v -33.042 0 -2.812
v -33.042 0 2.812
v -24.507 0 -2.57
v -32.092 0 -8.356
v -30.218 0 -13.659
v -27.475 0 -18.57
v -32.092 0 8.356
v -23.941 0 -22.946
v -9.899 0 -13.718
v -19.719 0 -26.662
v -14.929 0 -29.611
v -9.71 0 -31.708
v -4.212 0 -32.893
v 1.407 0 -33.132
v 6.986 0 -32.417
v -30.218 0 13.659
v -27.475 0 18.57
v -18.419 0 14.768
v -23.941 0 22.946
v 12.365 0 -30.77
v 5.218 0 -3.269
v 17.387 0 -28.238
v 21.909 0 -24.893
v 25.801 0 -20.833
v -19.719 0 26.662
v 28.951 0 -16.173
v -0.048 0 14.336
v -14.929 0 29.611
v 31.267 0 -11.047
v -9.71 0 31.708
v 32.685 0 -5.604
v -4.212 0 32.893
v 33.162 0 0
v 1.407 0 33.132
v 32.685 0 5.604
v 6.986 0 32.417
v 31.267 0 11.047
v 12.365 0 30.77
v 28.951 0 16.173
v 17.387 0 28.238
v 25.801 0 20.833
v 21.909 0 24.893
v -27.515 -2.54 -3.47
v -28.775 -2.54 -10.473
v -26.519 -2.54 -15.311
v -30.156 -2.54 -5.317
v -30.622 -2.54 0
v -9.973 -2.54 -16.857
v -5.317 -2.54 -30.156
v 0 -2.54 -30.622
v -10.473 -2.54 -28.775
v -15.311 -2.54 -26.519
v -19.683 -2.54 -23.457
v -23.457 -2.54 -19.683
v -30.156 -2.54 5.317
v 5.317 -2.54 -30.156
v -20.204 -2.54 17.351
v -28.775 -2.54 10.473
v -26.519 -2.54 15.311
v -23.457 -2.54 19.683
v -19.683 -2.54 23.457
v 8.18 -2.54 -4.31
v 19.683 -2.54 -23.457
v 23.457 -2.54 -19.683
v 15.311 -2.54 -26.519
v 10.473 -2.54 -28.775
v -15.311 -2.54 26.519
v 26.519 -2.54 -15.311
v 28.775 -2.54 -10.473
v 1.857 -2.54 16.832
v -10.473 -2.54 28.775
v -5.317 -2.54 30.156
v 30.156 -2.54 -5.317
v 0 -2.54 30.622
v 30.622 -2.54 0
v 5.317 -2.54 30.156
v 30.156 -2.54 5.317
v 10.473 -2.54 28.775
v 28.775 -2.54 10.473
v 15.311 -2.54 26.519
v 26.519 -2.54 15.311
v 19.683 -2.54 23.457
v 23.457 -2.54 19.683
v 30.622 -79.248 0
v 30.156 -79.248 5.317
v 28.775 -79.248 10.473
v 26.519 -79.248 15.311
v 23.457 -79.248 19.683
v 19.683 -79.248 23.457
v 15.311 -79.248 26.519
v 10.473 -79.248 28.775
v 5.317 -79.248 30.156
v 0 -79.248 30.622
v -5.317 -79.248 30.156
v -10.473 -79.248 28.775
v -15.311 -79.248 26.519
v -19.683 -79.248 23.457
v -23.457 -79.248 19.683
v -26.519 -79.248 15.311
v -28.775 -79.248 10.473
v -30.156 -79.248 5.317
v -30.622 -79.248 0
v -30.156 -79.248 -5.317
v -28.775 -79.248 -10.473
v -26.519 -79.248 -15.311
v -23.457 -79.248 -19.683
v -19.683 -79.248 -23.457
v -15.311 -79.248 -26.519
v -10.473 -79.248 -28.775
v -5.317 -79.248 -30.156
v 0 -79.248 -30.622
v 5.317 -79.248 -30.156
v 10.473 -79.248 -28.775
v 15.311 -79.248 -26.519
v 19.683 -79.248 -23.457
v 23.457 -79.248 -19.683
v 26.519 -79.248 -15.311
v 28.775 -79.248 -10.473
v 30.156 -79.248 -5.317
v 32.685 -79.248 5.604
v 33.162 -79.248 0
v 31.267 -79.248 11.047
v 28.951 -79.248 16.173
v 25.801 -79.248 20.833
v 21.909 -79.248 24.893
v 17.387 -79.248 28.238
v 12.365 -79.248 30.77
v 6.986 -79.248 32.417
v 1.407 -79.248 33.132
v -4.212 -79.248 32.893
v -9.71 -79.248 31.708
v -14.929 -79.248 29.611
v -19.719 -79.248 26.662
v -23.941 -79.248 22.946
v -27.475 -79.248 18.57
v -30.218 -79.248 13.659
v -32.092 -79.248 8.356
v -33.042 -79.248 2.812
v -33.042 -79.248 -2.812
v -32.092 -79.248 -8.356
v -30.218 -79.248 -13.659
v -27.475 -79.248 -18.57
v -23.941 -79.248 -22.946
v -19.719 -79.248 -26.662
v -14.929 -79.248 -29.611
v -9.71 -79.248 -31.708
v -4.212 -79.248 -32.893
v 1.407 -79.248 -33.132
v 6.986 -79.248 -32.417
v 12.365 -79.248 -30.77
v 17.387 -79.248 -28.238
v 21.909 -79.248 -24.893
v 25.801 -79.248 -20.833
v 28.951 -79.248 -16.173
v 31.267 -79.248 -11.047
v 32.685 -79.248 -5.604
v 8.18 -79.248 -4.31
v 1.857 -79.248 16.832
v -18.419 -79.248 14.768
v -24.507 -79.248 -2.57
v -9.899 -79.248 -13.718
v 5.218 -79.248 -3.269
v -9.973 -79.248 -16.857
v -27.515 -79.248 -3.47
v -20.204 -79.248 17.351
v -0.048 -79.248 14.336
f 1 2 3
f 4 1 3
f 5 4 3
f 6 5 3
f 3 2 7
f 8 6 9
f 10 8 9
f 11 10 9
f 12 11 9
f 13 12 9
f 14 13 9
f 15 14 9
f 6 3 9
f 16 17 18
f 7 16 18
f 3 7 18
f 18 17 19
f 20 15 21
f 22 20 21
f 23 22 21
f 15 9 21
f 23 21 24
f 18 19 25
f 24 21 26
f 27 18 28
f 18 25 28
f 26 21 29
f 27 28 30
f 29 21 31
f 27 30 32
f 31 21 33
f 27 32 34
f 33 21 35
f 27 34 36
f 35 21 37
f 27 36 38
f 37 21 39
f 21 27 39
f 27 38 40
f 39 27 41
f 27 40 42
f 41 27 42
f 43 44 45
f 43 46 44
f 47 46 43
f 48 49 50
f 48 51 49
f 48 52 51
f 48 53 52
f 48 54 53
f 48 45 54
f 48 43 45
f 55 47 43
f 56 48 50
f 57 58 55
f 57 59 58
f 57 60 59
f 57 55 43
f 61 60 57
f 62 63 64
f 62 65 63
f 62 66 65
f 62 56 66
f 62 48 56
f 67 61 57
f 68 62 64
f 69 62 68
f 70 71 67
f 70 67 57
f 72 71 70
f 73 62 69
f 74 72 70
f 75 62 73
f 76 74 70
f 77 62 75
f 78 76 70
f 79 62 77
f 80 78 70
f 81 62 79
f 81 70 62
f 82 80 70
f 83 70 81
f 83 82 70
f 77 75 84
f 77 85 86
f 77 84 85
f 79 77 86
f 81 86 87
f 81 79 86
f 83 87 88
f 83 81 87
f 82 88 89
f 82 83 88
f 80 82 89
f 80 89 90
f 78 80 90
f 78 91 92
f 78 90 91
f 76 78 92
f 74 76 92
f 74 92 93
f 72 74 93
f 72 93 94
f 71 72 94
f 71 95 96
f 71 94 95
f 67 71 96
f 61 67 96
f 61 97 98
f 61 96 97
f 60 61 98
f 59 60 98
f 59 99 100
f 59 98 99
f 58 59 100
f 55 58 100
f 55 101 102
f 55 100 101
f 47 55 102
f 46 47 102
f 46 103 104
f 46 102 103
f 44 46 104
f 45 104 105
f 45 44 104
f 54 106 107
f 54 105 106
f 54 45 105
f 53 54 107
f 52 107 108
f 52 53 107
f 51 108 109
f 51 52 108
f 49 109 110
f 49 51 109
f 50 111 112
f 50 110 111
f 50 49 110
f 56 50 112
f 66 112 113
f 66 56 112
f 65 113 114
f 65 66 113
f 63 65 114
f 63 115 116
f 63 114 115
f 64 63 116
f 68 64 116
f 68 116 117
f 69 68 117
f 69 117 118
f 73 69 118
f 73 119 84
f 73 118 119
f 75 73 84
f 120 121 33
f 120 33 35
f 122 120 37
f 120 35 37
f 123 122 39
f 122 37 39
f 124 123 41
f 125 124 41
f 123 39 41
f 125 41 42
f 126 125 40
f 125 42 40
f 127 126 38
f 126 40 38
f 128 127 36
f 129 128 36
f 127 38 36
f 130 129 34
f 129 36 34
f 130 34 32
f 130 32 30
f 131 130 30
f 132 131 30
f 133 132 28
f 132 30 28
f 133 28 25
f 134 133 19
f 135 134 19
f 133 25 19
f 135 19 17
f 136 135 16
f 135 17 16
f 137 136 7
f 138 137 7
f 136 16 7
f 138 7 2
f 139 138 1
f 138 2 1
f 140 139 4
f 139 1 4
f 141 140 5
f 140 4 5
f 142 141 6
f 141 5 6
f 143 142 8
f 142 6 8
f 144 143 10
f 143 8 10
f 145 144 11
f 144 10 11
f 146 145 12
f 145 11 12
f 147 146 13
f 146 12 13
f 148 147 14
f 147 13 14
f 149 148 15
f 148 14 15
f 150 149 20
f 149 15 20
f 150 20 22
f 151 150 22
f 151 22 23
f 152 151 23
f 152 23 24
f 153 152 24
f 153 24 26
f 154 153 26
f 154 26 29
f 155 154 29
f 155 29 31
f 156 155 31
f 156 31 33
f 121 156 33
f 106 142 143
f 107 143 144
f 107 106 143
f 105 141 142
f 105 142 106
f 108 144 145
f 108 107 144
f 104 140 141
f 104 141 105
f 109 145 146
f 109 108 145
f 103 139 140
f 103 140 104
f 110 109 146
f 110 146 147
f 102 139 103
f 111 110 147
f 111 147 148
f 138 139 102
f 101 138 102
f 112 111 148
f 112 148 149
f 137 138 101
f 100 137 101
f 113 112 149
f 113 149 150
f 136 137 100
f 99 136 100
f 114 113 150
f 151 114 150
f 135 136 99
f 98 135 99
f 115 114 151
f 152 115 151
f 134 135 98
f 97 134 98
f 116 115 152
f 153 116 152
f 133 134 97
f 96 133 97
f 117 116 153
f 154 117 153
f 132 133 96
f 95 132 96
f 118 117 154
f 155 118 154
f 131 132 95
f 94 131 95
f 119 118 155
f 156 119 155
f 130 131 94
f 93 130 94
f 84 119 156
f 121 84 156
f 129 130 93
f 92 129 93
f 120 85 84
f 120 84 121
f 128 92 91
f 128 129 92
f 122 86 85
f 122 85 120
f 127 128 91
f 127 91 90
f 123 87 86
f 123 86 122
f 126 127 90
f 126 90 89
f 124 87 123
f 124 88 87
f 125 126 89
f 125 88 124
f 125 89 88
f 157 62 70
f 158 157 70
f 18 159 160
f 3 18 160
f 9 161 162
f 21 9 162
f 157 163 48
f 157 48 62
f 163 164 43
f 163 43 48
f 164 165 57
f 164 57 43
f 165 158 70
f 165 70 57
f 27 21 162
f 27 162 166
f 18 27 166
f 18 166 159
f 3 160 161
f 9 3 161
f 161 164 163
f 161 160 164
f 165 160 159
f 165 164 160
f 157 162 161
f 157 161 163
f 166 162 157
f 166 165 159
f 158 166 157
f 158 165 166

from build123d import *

# Parameters (mm, degrees)
F0_R     = 33.1615614797
F1_DEPTH = 79.248
F3_DEPTH = 111.252
F4_T     = -2.54


with BuildPart() as f1:
    # F0 (on Front) → F1 (new body)
    with BuildSketch(Plane.XZ):
        Circle(F0_R)
    extrude(amount=F1_DEPTH)

    # F2 (on face) → F3 (cut)
    with BuildSketch(Plane.XZ.offset(79.248)):
        Polygon((-9.8989819324, -13.7179617404), (5.2176722472, -3.2694421143), (-0.0481573892, 14.3361204783), (-18.4192732631, 14.7684369255), (-24.507417648, -2.5699394088), align=None)
    extrude(amount=-F3_DEPTH, mode=Mode.SUBTRACT)

    # F4
    f4_openings = [f1.faces().sort_by_distance(p)[0] for p in [
        (-32.223611, -79.248, 0),
    ]]
    offset(amount=F4_T, openings=f4_openings, kind=Kind.INTERSECTION)


solid = f1.part
